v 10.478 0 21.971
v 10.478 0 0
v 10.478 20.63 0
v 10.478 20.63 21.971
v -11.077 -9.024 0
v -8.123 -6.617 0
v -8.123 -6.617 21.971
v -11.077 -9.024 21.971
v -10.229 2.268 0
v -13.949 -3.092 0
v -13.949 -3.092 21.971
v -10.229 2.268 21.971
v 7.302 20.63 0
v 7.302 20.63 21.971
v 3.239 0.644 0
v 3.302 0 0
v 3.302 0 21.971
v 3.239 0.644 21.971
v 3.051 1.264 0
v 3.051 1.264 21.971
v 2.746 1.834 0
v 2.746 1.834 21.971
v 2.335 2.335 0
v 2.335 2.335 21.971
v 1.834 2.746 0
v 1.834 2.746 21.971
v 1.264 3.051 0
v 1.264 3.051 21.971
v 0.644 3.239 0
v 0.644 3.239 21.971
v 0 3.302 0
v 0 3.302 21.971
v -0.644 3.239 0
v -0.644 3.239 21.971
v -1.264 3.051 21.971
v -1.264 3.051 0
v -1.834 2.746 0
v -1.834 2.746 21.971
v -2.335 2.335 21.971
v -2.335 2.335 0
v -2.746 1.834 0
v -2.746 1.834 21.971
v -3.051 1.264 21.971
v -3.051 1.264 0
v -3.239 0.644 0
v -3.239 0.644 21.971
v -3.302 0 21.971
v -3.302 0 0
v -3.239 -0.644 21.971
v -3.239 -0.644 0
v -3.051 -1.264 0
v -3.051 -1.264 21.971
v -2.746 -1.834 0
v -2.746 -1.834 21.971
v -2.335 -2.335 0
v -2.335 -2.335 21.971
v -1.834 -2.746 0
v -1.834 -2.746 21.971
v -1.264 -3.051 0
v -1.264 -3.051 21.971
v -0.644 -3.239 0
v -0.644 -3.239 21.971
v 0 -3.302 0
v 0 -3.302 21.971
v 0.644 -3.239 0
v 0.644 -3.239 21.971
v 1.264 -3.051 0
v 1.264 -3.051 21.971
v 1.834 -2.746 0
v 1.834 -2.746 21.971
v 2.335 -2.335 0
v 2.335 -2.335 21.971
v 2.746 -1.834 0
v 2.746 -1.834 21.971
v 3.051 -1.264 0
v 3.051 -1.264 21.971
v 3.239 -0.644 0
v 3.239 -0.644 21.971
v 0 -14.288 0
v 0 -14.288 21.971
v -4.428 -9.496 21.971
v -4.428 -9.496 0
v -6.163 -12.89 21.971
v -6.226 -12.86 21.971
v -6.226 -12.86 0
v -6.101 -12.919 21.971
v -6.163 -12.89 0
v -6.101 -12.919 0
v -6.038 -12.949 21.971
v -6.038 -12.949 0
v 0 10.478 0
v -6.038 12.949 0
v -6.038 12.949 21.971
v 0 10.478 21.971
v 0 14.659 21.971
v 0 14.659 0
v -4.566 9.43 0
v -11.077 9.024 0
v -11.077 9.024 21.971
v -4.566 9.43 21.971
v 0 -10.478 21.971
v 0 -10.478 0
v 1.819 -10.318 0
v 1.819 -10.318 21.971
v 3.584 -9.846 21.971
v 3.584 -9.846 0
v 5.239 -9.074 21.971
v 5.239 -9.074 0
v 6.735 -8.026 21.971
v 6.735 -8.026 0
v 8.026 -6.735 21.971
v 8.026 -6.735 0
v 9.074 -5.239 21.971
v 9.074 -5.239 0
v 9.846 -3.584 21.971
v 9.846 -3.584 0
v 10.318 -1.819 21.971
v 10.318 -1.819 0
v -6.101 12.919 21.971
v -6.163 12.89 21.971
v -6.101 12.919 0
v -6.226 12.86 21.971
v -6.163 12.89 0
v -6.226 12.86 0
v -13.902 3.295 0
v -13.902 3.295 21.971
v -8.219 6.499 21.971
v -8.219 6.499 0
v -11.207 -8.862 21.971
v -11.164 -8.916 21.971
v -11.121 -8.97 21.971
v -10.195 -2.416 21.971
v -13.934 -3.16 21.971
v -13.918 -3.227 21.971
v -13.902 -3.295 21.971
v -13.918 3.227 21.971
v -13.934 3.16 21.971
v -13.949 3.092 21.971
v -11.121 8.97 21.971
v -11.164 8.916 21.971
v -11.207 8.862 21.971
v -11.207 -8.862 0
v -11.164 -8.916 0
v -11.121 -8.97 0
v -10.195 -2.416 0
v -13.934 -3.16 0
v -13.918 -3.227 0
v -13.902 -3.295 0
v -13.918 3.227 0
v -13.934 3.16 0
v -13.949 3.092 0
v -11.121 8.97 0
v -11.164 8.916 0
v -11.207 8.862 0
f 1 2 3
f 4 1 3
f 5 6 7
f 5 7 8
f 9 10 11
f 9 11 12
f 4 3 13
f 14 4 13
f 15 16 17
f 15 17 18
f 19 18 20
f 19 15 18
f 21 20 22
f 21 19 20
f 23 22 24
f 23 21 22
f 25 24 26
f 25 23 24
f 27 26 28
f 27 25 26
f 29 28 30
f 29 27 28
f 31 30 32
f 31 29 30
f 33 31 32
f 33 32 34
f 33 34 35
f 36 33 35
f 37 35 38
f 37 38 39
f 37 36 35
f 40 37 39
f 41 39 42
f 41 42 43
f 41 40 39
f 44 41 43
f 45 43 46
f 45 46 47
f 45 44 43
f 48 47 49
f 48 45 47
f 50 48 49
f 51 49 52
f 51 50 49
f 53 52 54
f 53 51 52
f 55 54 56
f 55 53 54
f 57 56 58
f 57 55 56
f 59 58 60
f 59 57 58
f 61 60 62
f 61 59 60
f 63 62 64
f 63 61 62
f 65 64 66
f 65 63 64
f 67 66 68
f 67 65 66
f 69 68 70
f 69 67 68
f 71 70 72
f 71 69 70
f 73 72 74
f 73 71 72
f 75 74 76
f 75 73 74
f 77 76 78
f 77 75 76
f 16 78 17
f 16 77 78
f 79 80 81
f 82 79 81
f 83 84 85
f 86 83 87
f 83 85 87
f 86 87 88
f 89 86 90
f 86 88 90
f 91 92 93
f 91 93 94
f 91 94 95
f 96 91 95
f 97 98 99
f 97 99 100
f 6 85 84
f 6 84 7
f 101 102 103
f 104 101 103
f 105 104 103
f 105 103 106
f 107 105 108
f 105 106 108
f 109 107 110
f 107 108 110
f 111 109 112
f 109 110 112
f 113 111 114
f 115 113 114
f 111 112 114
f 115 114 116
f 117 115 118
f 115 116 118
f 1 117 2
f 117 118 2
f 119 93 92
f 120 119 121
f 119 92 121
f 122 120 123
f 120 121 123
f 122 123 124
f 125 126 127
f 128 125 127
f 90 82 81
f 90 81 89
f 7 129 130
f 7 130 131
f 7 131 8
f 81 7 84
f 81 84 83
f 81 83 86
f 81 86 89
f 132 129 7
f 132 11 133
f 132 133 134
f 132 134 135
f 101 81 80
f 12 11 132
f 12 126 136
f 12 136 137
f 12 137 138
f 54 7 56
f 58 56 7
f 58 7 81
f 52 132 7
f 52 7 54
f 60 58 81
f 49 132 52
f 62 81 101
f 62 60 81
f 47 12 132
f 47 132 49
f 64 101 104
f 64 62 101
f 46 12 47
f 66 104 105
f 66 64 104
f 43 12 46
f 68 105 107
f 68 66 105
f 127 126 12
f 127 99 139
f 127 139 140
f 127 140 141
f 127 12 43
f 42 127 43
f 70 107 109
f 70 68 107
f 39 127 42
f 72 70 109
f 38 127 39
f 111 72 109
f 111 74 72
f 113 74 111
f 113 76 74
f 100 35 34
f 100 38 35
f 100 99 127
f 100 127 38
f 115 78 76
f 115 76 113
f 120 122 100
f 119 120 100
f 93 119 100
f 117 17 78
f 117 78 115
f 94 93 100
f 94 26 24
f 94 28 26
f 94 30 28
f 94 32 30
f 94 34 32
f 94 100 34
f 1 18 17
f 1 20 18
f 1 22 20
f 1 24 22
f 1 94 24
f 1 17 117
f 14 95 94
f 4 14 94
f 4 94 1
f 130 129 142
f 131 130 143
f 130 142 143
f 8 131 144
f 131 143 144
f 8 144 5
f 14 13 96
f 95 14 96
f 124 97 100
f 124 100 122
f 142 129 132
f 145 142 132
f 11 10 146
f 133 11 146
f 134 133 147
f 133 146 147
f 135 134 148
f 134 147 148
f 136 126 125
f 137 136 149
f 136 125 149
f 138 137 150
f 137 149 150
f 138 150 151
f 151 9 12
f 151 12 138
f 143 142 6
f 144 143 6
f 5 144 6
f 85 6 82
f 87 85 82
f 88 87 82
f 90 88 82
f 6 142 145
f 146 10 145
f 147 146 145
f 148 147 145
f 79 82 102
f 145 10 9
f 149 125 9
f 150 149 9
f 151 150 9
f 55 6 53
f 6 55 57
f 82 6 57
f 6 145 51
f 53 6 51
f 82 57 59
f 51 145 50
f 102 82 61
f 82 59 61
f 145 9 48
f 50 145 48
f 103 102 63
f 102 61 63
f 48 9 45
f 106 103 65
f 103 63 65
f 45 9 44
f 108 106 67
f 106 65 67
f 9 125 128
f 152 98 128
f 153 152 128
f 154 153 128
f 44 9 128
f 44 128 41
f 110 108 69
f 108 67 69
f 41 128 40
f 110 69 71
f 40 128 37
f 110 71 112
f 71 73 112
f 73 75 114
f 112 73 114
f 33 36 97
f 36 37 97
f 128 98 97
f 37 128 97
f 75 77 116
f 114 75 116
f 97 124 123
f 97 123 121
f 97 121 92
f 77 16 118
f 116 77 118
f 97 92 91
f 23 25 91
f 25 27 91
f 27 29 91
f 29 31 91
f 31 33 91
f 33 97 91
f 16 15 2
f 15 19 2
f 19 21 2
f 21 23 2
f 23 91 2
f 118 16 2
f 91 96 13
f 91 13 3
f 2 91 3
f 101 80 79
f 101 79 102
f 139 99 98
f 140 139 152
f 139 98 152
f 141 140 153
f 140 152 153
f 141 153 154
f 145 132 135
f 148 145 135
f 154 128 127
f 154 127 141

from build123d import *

# Parameters (mm, degrees)
SKETCH1_R           = 3.302
BOSS_EXTRUDE1_DEPTH = 21.971
CUT_EXTRUDE1_DEPTH  = 22.971
CUT_EXTRUDE2_DEPTH  = 22.971


with BuildPart() as part:
    # Sketch1 → Boss-Extrude1 (new body)
    with BuildSketch(Plane.XY):
        with BuildLine():
            ThreePointArc((0, -10.4775), (7.4087113, -7.4087113), (10.4775, 0))
            Line((10.4775, 0), (10.4775, 20.629972189))
            Line((10.4775, 20.629972189), (7.3025, 20.629972189))
            Line((7.3025, 20.629972189), (-0.463735424, 14.279972189))
            ThreePointArc((-0.463735424, 14.279972189), (-14.285617923, -0.23189826), (0, -14.2875))
            Line((0, -14.2875), (0, -10.4775))
        make_face()
        Circle(SKETCH1_R, mode=Mode.SUBTRACT)
    extrude(amount=BOSS_EXTRUDE1_DEPTH)

    # Sketch3 → Cut-Extrude1 (cut, through all)
    with BuildSketch(Plane.XY.offset(21.971)):
        with BuildLine():
            Line((0, -14.2875), (-4.427982837, -9.495839839))
            Line((-4.427982837, -9.495839839), (-6.038158415, -12.948872507))
            ThreePointArc((-6.038158415, -12.948872507), (-3.092380984, -13.948829202), (0, -14.2875))
        make_face()
        with BuildLine():
            Line((-8.12333208, -6.617362176), (-11.077271018, -9.023675694))
            ThreePointArc((-11.077271018, -9.023675694), (-8.861614581, -11.207338813), (-6.225846847, -12.859684572))
            Line((-6.225846847, -12.859684572), (-8.12333208, -6.617362176))
        make_face()
        with BuildLine():
            Line((-10.195077632, -2.416277786), (-13.902378588, -3.294924253))
            ThreePointArc((-13.902378588, -3.294924253), (-12.859684572, -6.225846847), (-11.207338813, -8.861614581))
            Line((-11.207338813, -8.861614581), (-10.195077632, -2.416277786))
        make_face()
        with BuildLine():
            Line((-10.229141415, 2.267746055), (-13.948829202, 3.092380984))
            ThreePointArc((-13.948829202, 3.092380984), (-14.2875, 0), (-13.948829202, -3.092380984))
            Line((-13.948829202, -3.092380984), (-10.229141415, 2.267746055))
        make_face()
        with BuildLine():
            Line((-8.218715129, 6.49851736), (-11.207338813, 8.861614581))
            ThreePointArc((-11.207338813, 8.861614581), (-12.859684572, 6.225846847), (-13.902378588, 3.294924253))
            Line((-13.902378588, 3.294924253), (-8.218715129, 6.49851736))
        make_face()
        with BuildLine():
            Line((-4.565621021, 9.430435353), (-6.225846847, 12.859684572))
            ThreePointArc((-6.225846847, 12.859684572), (-8.861614581, 11.207338813), (-11.077271018, 9.023675694))
            Line((-11.077271018, 9.023675694), (-4.565621021, 9.430435353))
        make_face()
        with BuildLine():
            Line((0, 10.4775), (0, 14.2875))
            ThreePointArc((0, 14.2875), (-3.092380984, 13.948829202), (-6.038158415, 12.948872507))
            Line((-6.038158415, 12.948872507), (0, 10.4775))
        make_face()
    extrude(amount=-CUT_EXTRUDE1_DEPTH, mode=Mode.SUBTRACT)

    # Sketch4 → Cut-Extrude2 (cut, through all)
    with BuildSketch(Plane.XY.offset(21.971)):
        Polygon((-0.463735424, 14.279972189), (0, 14.2875), (0, 14.659141732), align=None)
    extrude(amount=-CUT_EXTRUDE2_DEPTH, mode=Mode.SUBTRACT)


solid = part.part
